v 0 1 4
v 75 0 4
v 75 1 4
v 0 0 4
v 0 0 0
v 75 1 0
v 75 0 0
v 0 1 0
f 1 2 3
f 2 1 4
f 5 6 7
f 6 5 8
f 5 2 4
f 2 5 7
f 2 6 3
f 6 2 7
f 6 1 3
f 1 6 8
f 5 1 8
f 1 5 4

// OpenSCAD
// Hello world for Openscad

cube([75, 1, 4]);

color("red")
text("Hello World");
